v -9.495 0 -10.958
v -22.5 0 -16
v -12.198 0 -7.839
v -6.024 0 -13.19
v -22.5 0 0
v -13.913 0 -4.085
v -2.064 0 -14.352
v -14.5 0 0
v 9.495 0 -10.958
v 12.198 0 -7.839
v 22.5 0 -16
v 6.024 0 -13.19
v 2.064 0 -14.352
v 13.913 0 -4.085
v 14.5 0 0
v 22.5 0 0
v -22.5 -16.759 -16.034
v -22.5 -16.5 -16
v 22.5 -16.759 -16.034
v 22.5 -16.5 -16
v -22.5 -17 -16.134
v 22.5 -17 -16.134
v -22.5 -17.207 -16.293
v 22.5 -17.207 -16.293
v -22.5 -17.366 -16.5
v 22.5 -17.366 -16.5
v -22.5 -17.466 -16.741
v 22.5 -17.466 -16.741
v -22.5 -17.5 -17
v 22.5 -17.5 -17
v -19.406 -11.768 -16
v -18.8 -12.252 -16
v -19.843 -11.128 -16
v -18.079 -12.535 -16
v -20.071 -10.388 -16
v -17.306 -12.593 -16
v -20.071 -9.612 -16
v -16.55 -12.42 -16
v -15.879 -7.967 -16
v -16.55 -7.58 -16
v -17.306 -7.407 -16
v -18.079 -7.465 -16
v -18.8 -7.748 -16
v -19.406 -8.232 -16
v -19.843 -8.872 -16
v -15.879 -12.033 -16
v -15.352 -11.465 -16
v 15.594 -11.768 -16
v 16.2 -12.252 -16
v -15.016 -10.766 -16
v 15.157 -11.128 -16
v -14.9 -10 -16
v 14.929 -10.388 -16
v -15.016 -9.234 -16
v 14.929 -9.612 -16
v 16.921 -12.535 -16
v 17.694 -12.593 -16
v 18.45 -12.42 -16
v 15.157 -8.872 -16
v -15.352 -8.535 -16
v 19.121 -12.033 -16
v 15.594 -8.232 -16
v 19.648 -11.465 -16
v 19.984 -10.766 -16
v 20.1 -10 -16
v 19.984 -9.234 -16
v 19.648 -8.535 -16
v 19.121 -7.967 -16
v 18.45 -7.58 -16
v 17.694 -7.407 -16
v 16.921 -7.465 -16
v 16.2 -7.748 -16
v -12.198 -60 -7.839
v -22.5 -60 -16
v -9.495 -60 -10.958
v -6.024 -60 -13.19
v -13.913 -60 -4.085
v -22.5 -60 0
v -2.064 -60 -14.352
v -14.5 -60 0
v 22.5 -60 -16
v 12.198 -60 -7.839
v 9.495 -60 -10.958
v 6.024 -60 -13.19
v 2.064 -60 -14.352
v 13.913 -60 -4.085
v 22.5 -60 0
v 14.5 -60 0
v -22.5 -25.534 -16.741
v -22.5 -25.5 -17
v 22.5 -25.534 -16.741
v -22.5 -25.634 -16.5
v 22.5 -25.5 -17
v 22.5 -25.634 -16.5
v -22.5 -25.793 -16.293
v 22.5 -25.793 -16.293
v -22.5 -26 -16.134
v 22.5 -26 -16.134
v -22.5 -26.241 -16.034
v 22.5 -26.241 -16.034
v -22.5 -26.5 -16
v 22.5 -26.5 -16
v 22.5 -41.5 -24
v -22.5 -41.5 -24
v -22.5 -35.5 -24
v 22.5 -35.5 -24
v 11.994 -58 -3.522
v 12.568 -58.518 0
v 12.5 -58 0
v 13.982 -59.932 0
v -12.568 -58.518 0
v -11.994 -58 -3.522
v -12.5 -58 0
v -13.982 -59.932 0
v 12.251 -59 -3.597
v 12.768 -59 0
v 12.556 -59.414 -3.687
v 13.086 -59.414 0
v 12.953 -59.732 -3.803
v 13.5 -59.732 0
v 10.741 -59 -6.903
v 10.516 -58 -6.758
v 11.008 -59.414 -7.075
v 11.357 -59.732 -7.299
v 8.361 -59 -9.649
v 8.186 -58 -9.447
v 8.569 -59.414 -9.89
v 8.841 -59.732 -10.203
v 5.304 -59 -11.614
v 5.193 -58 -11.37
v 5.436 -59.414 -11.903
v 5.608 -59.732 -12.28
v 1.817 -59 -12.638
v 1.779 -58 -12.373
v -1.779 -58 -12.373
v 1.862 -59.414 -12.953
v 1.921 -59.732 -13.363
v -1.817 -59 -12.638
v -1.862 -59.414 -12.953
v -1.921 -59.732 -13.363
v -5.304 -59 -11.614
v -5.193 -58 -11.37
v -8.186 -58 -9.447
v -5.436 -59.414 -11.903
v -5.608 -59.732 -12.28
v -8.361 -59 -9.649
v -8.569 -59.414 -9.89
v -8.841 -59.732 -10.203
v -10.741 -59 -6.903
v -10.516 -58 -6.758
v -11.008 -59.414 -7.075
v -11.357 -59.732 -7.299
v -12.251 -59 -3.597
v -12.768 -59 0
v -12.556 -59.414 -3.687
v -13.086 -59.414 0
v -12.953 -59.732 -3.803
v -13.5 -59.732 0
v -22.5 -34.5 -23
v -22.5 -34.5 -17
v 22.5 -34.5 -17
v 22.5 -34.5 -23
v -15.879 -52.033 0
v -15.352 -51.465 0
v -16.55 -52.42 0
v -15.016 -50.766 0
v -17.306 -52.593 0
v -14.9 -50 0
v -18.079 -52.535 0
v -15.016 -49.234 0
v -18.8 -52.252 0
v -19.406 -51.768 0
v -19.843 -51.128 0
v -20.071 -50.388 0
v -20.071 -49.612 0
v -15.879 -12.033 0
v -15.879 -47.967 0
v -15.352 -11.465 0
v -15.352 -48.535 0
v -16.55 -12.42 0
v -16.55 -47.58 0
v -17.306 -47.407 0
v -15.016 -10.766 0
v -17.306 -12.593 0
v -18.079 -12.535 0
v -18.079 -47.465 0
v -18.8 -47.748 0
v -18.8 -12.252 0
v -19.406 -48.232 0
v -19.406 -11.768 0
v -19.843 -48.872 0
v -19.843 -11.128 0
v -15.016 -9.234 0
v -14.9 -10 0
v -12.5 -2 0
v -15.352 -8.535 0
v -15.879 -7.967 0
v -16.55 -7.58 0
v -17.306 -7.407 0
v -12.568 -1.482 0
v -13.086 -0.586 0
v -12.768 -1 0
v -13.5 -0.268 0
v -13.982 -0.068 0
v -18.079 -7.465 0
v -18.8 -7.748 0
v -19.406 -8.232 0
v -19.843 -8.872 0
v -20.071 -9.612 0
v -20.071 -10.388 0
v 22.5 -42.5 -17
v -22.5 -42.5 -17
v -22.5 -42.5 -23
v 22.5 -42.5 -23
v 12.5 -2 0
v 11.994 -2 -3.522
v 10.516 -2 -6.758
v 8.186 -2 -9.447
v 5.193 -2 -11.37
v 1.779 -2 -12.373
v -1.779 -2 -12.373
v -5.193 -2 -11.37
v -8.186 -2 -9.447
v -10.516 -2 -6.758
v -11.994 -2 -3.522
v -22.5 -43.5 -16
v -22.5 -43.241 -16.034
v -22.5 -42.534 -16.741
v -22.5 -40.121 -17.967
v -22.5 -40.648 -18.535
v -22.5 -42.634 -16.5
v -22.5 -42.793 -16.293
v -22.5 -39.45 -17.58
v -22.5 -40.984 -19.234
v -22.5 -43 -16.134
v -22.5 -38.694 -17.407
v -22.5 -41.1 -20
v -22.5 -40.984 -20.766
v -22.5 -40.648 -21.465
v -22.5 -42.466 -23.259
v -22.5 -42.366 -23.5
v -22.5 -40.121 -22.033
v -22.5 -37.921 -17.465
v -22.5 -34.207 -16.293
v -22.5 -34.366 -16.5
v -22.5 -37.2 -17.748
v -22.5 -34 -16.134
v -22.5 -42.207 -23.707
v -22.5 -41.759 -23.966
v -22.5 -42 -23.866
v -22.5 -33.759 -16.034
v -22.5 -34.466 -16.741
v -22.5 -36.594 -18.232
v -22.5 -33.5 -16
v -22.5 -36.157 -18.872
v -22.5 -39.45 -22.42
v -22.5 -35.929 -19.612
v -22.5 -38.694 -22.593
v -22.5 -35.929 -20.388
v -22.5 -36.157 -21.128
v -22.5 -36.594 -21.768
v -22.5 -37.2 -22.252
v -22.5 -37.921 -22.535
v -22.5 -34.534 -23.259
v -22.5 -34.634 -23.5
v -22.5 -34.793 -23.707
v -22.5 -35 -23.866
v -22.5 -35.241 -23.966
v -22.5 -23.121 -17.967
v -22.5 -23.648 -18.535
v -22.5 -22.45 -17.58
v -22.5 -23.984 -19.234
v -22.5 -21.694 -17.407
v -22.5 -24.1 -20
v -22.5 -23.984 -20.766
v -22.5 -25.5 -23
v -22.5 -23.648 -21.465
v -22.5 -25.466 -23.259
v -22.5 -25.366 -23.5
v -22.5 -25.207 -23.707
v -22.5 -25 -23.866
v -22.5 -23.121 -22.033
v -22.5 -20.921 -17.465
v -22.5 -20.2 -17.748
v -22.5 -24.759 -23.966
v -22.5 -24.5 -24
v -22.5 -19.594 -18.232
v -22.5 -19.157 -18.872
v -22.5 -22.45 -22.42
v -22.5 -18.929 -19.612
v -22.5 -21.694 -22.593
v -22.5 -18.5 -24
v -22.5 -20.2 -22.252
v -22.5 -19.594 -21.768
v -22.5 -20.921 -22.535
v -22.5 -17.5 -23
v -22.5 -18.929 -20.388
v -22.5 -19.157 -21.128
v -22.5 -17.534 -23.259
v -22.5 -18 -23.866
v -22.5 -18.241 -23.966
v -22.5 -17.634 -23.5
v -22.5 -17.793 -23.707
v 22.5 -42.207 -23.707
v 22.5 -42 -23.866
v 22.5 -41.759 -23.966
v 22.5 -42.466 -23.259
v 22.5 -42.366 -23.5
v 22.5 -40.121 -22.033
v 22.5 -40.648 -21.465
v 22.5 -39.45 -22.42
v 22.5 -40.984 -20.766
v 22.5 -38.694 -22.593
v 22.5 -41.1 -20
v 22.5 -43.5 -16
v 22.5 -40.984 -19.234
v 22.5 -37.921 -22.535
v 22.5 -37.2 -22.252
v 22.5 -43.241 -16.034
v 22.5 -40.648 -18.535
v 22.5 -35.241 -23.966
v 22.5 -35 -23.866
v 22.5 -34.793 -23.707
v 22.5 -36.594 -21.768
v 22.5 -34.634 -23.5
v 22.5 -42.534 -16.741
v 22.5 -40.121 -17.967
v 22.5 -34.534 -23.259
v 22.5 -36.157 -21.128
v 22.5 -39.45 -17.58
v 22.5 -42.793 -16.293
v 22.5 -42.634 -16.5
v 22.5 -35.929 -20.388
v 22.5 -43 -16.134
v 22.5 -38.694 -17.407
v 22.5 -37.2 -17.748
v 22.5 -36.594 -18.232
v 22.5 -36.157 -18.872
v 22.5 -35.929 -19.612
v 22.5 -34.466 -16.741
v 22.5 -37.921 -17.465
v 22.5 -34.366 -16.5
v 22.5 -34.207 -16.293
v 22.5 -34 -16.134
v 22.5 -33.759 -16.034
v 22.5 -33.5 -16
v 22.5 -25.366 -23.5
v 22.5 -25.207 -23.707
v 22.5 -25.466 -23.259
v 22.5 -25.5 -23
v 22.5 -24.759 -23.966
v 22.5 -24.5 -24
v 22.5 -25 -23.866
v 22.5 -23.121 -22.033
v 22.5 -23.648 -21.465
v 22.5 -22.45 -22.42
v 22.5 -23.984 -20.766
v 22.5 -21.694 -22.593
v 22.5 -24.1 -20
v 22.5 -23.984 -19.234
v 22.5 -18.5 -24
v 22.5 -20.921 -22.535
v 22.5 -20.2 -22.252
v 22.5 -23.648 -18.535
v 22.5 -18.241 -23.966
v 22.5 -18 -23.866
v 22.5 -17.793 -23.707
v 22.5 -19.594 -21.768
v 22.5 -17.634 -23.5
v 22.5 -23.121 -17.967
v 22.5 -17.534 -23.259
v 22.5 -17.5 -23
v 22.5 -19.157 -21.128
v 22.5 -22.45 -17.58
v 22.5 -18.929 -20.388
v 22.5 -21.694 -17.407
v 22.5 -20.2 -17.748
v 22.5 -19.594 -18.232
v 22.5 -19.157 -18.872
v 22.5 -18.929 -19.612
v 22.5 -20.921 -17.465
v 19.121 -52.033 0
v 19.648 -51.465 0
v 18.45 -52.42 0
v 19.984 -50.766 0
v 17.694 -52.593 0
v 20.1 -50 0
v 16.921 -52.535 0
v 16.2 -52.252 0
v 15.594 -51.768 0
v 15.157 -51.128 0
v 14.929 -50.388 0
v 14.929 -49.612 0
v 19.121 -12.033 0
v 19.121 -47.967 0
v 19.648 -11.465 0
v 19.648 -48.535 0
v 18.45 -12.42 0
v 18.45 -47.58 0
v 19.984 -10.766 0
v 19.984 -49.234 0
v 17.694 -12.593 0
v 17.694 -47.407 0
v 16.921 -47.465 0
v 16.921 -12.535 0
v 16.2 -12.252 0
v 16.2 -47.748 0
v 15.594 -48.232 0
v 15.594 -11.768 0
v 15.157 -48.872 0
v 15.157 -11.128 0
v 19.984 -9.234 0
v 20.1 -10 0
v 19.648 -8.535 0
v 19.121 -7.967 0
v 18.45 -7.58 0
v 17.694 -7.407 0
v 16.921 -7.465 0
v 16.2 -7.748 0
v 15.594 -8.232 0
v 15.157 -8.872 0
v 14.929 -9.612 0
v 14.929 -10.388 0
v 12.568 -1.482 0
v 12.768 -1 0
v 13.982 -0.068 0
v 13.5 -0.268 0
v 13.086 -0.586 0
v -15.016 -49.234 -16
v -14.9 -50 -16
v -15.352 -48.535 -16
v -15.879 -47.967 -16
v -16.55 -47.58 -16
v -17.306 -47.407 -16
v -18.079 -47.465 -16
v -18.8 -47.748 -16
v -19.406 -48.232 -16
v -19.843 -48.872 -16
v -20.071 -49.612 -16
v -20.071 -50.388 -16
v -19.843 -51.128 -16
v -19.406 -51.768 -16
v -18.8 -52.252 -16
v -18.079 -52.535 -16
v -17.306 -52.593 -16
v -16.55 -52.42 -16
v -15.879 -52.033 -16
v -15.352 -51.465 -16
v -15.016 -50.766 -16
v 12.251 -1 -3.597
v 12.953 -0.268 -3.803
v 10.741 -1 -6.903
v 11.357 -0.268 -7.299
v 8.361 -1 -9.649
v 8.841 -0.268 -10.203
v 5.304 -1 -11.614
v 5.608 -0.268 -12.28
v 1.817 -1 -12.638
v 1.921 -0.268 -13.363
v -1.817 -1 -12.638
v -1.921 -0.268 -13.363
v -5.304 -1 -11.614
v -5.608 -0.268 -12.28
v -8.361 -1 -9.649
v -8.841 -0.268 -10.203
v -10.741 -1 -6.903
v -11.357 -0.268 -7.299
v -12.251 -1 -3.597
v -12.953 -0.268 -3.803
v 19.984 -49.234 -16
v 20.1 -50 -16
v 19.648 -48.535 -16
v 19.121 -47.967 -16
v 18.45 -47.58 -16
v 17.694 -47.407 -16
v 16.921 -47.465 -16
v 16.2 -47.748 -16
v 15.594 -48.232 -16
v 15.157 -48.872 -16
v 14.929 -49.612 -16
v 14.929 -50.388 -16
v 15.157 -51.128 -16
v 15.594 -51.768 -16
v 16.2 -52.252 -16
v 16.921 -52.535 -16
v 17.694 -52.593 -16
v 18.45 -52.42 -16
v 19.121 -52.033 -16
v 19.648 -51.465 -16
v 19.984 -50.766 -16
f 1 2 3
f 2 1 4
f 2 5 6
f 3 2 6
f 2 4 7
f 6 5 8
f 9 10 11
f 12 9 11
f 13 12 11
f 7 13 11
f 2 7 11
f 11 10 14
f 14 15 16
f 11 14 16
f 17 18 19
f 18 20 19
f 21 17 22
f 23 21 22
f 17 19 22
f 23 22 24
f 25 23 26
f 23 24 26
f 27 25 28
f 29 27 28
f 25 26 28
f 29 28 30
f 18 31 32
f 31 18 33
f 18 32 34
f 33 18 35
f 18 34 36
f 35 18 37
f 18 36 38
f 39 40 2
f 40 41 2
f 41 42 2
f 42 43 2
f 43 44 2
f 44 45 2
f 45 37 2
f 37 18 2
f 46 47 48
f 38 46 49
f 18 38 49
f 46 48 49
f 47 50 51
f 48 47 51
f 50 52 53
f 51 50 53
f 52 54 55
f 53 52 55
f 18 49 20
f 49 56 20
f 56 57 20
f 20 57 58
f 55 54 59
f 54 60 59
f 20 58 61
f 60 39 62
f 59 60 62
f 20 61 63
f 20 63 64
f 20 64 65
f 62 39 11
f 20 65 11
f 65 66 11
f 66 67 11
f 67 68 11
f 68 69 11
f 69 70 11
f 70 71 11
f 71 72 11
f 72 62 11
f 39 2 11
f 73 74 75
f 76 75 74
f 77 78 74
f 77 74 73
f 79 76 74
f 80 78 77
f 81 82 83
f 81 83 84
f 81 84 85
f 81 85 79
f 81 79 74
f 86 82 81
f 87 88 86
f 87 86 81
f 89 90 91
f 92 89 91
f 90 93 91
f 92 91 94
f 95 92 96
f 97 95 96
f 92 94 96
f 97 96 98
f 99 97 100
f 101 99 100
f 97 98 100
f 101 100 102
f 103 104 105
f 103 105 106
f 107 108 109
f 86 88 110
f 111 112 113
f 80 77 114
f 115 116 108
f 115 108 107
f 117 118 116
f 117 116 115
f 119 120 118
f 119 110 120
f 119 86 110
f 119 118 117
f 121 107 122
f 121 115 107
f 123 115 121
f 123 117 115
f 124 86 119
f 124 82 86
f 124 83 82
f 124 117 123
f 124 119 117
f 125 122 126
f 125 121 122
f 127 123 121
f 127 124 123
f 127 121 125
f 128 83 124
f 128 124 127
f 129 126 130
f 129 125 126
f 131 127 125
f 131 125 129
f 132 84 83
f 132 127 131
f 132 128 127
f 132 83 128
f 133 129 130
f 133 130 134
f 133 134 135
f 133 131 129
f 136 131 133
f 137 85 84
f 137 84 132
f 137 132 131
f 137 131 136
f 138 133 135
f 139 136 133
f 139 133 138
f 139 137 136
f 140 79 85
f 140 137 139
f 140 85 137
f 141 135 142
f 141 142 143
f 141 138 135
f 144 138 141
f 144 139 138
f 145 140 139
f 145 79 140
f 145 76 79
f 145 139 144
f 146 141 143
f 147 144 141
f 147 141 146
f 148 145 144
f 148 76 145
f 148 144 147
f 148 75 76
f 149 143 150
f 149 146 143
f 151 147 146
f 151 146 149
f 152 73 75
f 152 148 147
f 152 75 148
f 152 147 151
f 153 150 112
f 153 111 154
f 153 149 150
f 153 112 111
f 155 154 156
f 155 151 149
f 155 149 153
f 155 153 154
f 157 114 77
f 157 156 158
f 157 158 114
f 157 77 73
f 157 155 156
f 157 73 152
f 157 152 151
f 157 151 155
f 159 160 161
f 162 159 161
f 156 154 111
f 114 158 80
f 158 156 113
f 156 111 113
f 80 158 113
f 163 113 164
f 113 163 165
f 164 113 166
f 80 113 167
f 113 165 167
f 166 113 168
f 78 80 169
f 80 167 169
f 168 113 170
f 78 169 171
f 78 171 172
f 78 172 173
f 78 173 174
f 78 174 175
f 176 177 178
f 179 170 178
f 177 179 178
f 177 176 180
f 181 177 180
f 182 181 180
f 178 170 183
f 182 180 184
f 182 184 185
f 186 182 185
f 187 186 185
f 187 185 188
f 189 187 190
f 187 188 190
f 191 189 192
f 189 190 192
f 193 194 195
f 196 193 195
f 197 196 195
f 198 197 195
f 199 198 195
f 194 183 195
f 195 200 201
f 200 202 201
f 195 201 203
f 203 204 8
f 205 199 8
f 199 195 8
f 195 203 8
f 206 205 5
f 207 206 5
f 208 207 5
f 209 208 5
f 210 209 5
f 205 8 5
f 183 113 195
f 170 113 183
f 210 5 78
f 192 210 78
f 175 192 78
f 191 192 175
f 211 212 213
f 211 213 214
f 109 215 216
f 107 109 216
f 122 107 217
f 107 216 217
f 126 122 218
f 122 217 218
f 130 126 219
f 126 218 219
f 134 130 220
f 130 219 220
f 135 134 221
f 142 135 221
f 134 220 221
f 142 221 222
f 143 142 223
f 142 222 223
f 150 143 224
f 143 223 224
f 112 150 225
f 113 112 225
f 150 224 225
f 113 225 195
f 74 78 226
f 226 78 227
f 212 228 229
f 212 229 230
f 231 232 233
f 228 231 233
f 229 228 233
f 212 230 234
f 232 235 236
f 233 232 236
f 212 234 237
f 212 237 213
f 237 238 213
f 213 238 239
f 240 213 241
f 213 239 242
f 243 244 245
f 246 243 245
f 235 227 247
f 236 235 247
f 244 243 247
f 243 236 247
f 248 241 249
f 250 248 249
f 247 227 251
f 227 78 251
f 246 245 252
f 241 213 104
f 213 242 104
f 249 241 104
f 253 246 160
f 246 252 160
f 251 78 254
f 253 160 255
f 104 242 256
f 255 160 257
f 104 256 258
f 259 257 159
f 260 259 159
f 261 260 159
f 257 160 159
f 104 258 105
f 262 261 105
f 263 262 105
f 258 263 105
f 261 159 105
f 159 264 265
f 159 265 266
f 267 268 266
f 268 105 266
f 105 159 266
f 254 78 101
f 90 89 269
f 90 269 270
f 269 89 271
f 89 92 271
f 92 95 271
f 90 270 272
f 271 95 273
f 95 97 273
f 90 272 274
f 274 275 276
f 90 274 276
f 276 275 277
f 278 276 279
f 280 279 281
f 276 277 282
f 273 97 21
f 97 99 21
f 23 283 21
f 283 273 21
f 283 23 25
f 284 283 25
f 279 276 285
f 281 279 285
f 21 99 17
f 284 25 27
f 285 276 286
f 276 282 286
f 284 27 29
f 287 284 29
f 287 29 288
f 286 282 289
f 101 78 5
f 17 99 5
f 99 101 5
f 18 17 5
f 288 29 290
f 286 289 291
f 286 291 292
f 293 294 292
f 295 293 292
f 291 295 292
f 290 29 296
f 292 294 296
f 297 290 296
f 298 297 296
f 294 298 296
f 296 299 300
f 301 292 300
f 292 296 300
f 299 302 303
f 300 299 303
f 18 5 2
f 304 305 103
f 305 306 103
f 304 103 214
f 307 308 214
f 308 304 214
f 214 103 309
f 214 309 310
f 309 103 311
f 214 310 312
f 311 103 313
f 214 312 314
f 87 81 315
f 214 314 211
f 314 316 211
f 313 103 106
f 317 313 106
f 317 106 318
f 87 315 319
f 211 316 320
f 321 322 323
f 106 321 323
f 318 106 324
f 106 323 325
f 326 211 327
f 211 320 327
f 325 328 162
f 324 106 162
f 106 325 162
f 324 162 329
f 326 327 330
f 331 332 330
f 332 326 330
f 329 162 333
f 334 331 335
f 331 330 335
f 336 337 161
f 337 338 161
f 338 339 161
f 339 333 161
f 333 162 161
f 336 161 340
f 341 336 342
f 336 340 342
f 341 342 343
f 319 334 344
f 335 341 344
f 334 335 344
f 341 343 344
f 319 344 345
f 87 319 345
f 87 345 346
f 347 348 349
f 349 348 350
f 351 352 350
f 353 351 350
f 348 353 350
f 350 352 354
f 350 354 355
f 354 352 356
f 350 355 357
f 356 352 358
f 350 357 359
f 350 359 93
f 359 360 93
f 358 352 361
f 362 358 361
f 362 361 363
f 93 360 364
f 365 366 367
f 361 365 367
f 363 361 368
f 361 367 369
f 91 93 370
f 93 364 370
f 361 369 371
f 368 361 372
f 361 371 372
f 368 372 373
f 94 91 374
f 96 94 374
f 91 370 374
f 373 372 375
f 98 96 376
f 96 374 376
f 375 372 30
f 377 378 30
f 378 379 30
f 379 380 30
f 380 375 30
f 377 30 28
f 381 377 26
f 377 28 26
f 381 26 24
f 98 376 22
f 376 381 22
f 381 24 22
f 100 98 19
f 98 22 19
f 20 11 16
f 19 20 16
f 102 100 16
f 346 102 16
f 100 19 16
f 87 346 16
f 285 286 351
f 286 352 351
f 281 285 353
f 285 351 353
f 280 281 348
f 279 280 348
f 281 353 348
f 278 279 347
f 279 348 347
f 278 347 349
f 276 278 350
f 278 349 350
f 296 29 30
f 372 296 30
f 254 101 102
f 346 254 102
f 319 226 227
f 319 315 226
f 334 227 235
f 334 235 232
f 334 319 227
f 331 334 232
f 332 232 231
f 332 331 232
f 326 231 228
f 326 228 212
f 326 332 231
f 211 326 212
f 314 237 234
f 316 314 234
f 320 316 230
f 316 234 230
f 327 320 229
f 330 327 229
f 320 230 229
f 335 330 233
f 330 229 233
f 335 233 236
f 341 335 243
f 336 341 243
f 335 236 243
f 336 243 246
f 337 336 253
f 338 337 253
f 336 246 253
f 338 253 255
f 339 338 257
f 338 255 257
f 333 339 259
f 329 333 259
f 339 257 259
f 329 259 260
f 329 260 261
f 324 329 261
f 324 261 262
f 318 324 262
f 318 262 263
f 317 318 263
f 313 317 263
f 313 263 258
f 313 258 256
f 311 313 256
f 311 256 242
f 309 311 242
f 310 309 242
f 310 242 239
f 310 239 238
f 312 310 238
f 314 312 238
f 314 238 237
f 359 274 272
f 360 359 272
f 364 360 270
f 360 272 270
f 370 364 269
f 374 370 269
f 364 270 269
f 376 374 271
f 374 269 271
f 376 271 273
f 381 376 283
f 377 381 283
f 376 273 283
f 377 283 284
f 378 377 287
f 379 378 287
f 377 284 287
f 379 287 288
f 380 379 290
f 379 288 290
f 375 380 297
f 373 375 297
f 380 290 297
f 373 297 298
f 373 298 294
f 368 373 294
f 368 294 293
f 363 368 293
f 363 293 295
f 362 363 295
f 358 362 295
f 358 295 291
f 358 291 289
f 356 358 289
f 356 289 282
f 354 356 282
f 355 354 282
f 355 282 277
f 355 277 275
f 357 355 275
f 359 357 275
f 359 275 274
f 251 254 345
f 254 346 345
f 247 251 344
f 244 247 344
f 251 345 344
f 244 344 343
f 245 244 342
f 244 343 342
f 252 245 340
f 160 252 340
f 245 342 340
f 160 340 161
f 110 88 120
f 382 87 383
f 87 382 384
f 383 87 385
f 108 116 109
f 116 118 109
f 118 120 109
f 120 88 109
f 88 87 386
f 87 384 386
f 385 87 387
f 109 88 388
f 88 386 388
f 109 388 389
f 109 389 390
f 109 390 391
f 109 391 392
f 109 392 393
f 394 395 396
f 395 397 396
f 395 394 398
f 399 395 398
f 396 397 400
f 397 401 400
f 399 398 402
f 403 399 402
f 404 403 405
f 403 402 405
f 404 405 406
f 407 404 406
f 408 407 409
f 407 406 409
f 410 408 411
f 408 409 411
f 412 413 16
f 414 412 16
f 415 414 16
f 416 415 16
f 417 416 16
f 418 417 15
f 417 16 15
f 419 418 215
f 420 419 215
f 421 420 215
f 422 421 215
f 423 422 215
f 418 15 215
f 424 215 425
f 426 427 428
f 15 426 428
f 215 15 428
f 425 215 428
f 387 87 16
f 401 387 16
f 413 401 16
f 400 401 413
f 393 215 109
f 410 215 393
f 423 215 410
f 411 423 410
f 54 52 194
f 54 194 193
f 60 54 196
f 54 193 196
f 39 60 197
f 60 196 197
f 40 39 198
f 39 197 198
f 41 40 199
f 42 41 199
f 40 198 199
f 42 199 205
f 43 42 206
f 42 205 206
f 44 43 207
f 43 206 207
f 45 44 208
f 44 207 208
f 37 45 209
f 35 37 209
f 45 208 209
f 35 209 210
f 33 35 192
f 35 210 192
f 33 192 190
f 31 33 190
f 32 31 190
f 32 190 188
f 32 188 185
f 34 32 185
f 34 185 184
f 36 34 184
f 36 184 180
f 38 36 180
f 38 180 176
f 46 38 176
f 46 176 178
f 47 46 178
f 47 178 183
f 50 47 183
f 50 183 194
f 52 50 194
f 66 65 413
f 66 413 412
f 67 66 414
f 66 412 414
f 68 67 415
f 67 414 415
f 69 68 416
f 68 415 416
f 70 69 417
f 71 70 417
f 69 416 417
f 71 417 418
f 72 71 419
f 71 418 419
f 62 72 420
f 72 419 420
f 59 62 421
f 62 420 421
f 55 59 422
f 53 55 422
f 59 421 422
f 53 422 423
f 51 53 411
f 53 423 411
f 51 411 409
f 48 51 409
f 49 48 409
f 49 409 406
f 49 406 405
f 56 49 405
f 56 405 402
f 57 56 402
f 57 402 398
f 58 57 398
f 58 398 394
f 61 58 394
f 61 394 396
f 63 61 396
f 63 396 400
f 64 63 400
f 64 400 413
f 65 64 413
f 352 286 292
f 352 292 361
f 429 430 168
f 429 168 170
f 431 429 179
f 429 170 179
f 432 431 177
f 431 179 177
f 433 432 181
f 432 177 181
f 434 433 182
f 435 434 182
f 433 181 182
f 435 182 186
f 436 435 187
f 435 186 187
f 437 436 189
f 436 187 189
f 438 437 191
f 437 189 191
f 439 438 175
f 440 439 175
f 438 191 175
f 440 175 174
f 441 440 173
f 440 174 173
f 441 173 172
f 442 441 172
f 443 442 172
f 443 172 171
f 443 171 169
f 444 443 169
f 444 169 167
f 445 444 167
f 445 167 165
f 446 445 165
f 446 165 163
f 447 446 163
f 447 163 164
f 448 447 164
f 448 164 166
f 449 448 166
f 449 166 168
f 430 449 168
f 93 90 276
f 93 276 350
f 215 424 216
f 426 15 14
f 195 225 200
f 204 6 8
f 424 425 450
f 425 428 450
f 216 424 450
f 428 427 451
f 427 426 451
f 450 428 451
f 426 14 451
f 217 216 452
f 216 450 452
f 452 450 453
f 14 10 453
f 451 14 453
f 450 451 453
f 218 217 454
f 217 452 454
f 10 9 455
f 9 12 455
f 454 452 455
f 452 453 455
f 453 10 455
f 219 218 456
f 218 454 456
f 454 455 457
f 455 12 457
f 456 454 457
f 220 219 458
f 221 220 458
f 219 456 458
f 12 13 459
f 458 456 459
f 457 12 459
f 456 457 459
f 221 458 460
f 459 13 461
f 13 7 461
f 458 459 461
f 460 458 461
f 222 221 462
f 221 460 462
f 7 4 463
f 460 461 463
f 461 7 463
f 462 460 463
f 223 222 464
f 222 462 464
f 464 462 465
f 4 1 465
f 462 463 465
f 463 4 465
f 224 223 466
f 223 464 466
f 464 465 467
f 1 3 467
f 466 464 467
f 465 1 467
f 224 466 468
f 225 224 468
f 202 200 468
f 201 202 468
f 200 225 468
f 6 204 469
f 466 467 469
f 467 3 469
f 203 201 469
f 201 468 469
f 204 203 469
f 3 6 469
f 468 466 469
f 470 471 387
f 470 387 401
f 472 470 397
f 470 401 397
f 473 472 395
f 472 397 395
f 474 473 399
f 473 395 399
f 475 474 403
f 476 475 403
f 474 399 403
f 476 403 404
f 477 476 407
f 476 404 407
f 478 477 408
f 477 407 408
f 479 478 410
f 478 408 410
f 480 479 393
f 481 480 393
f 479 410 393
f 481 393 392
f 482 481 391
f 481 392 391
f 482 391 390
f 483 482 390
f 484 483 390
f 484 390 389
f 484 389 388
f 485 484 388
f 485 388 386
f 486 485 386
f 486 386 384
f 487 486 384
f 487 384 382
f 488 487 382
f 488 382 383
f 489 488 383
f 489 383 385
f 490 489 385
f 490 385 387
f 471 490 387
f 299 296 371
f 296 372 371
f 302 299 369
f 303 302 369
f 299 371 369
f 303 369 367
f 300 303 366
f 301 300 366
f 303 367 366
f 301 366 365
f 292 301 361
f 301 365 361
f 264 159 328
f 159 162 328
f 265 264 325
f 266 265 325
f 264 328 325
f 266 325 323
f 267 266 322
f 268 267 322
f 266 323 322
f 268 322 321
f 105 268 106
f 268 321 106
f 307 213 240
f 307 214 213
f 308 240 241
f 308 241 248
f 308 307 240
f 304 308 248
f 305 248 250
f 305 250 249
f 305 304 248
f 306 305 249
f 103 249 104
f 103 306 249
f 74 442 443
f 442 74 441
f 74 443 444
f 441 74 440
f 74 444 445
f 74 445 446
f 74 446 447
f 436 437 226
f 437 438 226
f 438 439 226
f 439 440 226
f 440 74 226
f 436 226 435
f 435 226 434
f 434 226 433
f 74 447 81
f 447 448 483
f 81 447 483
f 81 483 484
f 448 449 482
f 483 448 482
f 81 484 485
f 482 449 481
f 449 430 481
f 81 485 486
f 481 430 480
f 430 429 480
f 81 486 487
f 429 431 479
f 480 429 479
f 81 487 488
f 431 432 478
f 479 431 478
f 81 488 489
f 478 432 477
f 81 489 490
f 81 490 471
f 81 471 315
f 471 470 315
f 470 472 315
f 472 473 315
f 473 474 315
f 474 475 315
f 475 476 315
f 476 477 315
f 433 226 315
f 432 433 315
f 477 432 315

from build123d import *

# Parameters (mm, degrees)
F1_DEPTH = 60
F2_R     = 2.6
F3_DEPTH = 25
F4_R     = 2
F5_W     = 45
F5_H     = 8
F6_DEPTH = 8
F7_R     = 2.6
F8_DEPTH = 50
F9_R     = 1


with BuildPart() as f1:
    # F0 (on Front) → F1 (new body)
    with BuildSketch(Plane.XZ):
        with BuildLine():
            ThreePointArc((12.5, 0), (0, -12.5), (-12.5, 0))
            Line((-12.5, 0), (-22.5, 0))
            Line((-22.5, 0), (-22.5, -16))
            Line((-22.5, -16), (22.5, -16))
            Line((22.5, -16), (22.5, 0))
            Line((22.5, 0), (12.5, 0))
        make_face()
    extrude(amount=F1_DEPTH)

    # F2 (on face) → F3 (cut)
    with BuildSketch(Plane.XY):
        with Locations((-17.5, -50)):
            Circle(F2_R)
        with Locations((-17.5, -10)):
            Circle(F2_R)
        with Locations((17.5, -50)):
            Circle(F2_R)
        with Locations((17.5, -10)):
            Circle(F2_R)
    extrude(amount=-F3_DEPTH, mode=Mode.SUBTRACT)

    # F4
    f4_edges = [f1.edges().sort_by_distance(p)[0] for p in [
        (0, -60, -12.5),
        (0, 0, -12.5),
    ]]
    fillet(f4_edges, radius=F4_R)

    # F5 (on face) → F6 (join)
    with BuildSketch(Plane(origin=(0, 0, -16), x_dir=(1, 0, 0), z_dir=(0, 0, -1))):
        with Locations((0, 21.5)):
            Rectangle(F5_W, F5_H)
        with Locations((0, 38.5)):
            Rectangle(F5_W, F5_H)
    extrude(amount=F6_DEPTH)

    # F7 (on face) → F8 (cut)
    with BuildSketch(Plane(origin=(-22.5, 0, 0), x_dir=(0, -1, 0), z_dir=(-1, 0, 0))):
        with Locations((38.5, -20)):
            Circle(F7_R)
        with Locations((21.5, -20)):
            Circle(F7_R)
    extrude(amount=-F8_DEPTH, mode=Mode.SUBTRACT)

    # F9
    f9_edges = [f1.edges().sort_by_distance(p)[0] for p in [
        (0, -17.5, -24),
        (0, -17.5, -16),
        (0, -25.5, -24),
        (0, -25.5, -16),
        (0, -34.5, -16),
        (0, -34.5, -24),
        (0, -42.5, -24),
        (0, -42.5, -16),
    ]]
    fillet(f9_edges, radius=F9_R)


solid = f1.part
